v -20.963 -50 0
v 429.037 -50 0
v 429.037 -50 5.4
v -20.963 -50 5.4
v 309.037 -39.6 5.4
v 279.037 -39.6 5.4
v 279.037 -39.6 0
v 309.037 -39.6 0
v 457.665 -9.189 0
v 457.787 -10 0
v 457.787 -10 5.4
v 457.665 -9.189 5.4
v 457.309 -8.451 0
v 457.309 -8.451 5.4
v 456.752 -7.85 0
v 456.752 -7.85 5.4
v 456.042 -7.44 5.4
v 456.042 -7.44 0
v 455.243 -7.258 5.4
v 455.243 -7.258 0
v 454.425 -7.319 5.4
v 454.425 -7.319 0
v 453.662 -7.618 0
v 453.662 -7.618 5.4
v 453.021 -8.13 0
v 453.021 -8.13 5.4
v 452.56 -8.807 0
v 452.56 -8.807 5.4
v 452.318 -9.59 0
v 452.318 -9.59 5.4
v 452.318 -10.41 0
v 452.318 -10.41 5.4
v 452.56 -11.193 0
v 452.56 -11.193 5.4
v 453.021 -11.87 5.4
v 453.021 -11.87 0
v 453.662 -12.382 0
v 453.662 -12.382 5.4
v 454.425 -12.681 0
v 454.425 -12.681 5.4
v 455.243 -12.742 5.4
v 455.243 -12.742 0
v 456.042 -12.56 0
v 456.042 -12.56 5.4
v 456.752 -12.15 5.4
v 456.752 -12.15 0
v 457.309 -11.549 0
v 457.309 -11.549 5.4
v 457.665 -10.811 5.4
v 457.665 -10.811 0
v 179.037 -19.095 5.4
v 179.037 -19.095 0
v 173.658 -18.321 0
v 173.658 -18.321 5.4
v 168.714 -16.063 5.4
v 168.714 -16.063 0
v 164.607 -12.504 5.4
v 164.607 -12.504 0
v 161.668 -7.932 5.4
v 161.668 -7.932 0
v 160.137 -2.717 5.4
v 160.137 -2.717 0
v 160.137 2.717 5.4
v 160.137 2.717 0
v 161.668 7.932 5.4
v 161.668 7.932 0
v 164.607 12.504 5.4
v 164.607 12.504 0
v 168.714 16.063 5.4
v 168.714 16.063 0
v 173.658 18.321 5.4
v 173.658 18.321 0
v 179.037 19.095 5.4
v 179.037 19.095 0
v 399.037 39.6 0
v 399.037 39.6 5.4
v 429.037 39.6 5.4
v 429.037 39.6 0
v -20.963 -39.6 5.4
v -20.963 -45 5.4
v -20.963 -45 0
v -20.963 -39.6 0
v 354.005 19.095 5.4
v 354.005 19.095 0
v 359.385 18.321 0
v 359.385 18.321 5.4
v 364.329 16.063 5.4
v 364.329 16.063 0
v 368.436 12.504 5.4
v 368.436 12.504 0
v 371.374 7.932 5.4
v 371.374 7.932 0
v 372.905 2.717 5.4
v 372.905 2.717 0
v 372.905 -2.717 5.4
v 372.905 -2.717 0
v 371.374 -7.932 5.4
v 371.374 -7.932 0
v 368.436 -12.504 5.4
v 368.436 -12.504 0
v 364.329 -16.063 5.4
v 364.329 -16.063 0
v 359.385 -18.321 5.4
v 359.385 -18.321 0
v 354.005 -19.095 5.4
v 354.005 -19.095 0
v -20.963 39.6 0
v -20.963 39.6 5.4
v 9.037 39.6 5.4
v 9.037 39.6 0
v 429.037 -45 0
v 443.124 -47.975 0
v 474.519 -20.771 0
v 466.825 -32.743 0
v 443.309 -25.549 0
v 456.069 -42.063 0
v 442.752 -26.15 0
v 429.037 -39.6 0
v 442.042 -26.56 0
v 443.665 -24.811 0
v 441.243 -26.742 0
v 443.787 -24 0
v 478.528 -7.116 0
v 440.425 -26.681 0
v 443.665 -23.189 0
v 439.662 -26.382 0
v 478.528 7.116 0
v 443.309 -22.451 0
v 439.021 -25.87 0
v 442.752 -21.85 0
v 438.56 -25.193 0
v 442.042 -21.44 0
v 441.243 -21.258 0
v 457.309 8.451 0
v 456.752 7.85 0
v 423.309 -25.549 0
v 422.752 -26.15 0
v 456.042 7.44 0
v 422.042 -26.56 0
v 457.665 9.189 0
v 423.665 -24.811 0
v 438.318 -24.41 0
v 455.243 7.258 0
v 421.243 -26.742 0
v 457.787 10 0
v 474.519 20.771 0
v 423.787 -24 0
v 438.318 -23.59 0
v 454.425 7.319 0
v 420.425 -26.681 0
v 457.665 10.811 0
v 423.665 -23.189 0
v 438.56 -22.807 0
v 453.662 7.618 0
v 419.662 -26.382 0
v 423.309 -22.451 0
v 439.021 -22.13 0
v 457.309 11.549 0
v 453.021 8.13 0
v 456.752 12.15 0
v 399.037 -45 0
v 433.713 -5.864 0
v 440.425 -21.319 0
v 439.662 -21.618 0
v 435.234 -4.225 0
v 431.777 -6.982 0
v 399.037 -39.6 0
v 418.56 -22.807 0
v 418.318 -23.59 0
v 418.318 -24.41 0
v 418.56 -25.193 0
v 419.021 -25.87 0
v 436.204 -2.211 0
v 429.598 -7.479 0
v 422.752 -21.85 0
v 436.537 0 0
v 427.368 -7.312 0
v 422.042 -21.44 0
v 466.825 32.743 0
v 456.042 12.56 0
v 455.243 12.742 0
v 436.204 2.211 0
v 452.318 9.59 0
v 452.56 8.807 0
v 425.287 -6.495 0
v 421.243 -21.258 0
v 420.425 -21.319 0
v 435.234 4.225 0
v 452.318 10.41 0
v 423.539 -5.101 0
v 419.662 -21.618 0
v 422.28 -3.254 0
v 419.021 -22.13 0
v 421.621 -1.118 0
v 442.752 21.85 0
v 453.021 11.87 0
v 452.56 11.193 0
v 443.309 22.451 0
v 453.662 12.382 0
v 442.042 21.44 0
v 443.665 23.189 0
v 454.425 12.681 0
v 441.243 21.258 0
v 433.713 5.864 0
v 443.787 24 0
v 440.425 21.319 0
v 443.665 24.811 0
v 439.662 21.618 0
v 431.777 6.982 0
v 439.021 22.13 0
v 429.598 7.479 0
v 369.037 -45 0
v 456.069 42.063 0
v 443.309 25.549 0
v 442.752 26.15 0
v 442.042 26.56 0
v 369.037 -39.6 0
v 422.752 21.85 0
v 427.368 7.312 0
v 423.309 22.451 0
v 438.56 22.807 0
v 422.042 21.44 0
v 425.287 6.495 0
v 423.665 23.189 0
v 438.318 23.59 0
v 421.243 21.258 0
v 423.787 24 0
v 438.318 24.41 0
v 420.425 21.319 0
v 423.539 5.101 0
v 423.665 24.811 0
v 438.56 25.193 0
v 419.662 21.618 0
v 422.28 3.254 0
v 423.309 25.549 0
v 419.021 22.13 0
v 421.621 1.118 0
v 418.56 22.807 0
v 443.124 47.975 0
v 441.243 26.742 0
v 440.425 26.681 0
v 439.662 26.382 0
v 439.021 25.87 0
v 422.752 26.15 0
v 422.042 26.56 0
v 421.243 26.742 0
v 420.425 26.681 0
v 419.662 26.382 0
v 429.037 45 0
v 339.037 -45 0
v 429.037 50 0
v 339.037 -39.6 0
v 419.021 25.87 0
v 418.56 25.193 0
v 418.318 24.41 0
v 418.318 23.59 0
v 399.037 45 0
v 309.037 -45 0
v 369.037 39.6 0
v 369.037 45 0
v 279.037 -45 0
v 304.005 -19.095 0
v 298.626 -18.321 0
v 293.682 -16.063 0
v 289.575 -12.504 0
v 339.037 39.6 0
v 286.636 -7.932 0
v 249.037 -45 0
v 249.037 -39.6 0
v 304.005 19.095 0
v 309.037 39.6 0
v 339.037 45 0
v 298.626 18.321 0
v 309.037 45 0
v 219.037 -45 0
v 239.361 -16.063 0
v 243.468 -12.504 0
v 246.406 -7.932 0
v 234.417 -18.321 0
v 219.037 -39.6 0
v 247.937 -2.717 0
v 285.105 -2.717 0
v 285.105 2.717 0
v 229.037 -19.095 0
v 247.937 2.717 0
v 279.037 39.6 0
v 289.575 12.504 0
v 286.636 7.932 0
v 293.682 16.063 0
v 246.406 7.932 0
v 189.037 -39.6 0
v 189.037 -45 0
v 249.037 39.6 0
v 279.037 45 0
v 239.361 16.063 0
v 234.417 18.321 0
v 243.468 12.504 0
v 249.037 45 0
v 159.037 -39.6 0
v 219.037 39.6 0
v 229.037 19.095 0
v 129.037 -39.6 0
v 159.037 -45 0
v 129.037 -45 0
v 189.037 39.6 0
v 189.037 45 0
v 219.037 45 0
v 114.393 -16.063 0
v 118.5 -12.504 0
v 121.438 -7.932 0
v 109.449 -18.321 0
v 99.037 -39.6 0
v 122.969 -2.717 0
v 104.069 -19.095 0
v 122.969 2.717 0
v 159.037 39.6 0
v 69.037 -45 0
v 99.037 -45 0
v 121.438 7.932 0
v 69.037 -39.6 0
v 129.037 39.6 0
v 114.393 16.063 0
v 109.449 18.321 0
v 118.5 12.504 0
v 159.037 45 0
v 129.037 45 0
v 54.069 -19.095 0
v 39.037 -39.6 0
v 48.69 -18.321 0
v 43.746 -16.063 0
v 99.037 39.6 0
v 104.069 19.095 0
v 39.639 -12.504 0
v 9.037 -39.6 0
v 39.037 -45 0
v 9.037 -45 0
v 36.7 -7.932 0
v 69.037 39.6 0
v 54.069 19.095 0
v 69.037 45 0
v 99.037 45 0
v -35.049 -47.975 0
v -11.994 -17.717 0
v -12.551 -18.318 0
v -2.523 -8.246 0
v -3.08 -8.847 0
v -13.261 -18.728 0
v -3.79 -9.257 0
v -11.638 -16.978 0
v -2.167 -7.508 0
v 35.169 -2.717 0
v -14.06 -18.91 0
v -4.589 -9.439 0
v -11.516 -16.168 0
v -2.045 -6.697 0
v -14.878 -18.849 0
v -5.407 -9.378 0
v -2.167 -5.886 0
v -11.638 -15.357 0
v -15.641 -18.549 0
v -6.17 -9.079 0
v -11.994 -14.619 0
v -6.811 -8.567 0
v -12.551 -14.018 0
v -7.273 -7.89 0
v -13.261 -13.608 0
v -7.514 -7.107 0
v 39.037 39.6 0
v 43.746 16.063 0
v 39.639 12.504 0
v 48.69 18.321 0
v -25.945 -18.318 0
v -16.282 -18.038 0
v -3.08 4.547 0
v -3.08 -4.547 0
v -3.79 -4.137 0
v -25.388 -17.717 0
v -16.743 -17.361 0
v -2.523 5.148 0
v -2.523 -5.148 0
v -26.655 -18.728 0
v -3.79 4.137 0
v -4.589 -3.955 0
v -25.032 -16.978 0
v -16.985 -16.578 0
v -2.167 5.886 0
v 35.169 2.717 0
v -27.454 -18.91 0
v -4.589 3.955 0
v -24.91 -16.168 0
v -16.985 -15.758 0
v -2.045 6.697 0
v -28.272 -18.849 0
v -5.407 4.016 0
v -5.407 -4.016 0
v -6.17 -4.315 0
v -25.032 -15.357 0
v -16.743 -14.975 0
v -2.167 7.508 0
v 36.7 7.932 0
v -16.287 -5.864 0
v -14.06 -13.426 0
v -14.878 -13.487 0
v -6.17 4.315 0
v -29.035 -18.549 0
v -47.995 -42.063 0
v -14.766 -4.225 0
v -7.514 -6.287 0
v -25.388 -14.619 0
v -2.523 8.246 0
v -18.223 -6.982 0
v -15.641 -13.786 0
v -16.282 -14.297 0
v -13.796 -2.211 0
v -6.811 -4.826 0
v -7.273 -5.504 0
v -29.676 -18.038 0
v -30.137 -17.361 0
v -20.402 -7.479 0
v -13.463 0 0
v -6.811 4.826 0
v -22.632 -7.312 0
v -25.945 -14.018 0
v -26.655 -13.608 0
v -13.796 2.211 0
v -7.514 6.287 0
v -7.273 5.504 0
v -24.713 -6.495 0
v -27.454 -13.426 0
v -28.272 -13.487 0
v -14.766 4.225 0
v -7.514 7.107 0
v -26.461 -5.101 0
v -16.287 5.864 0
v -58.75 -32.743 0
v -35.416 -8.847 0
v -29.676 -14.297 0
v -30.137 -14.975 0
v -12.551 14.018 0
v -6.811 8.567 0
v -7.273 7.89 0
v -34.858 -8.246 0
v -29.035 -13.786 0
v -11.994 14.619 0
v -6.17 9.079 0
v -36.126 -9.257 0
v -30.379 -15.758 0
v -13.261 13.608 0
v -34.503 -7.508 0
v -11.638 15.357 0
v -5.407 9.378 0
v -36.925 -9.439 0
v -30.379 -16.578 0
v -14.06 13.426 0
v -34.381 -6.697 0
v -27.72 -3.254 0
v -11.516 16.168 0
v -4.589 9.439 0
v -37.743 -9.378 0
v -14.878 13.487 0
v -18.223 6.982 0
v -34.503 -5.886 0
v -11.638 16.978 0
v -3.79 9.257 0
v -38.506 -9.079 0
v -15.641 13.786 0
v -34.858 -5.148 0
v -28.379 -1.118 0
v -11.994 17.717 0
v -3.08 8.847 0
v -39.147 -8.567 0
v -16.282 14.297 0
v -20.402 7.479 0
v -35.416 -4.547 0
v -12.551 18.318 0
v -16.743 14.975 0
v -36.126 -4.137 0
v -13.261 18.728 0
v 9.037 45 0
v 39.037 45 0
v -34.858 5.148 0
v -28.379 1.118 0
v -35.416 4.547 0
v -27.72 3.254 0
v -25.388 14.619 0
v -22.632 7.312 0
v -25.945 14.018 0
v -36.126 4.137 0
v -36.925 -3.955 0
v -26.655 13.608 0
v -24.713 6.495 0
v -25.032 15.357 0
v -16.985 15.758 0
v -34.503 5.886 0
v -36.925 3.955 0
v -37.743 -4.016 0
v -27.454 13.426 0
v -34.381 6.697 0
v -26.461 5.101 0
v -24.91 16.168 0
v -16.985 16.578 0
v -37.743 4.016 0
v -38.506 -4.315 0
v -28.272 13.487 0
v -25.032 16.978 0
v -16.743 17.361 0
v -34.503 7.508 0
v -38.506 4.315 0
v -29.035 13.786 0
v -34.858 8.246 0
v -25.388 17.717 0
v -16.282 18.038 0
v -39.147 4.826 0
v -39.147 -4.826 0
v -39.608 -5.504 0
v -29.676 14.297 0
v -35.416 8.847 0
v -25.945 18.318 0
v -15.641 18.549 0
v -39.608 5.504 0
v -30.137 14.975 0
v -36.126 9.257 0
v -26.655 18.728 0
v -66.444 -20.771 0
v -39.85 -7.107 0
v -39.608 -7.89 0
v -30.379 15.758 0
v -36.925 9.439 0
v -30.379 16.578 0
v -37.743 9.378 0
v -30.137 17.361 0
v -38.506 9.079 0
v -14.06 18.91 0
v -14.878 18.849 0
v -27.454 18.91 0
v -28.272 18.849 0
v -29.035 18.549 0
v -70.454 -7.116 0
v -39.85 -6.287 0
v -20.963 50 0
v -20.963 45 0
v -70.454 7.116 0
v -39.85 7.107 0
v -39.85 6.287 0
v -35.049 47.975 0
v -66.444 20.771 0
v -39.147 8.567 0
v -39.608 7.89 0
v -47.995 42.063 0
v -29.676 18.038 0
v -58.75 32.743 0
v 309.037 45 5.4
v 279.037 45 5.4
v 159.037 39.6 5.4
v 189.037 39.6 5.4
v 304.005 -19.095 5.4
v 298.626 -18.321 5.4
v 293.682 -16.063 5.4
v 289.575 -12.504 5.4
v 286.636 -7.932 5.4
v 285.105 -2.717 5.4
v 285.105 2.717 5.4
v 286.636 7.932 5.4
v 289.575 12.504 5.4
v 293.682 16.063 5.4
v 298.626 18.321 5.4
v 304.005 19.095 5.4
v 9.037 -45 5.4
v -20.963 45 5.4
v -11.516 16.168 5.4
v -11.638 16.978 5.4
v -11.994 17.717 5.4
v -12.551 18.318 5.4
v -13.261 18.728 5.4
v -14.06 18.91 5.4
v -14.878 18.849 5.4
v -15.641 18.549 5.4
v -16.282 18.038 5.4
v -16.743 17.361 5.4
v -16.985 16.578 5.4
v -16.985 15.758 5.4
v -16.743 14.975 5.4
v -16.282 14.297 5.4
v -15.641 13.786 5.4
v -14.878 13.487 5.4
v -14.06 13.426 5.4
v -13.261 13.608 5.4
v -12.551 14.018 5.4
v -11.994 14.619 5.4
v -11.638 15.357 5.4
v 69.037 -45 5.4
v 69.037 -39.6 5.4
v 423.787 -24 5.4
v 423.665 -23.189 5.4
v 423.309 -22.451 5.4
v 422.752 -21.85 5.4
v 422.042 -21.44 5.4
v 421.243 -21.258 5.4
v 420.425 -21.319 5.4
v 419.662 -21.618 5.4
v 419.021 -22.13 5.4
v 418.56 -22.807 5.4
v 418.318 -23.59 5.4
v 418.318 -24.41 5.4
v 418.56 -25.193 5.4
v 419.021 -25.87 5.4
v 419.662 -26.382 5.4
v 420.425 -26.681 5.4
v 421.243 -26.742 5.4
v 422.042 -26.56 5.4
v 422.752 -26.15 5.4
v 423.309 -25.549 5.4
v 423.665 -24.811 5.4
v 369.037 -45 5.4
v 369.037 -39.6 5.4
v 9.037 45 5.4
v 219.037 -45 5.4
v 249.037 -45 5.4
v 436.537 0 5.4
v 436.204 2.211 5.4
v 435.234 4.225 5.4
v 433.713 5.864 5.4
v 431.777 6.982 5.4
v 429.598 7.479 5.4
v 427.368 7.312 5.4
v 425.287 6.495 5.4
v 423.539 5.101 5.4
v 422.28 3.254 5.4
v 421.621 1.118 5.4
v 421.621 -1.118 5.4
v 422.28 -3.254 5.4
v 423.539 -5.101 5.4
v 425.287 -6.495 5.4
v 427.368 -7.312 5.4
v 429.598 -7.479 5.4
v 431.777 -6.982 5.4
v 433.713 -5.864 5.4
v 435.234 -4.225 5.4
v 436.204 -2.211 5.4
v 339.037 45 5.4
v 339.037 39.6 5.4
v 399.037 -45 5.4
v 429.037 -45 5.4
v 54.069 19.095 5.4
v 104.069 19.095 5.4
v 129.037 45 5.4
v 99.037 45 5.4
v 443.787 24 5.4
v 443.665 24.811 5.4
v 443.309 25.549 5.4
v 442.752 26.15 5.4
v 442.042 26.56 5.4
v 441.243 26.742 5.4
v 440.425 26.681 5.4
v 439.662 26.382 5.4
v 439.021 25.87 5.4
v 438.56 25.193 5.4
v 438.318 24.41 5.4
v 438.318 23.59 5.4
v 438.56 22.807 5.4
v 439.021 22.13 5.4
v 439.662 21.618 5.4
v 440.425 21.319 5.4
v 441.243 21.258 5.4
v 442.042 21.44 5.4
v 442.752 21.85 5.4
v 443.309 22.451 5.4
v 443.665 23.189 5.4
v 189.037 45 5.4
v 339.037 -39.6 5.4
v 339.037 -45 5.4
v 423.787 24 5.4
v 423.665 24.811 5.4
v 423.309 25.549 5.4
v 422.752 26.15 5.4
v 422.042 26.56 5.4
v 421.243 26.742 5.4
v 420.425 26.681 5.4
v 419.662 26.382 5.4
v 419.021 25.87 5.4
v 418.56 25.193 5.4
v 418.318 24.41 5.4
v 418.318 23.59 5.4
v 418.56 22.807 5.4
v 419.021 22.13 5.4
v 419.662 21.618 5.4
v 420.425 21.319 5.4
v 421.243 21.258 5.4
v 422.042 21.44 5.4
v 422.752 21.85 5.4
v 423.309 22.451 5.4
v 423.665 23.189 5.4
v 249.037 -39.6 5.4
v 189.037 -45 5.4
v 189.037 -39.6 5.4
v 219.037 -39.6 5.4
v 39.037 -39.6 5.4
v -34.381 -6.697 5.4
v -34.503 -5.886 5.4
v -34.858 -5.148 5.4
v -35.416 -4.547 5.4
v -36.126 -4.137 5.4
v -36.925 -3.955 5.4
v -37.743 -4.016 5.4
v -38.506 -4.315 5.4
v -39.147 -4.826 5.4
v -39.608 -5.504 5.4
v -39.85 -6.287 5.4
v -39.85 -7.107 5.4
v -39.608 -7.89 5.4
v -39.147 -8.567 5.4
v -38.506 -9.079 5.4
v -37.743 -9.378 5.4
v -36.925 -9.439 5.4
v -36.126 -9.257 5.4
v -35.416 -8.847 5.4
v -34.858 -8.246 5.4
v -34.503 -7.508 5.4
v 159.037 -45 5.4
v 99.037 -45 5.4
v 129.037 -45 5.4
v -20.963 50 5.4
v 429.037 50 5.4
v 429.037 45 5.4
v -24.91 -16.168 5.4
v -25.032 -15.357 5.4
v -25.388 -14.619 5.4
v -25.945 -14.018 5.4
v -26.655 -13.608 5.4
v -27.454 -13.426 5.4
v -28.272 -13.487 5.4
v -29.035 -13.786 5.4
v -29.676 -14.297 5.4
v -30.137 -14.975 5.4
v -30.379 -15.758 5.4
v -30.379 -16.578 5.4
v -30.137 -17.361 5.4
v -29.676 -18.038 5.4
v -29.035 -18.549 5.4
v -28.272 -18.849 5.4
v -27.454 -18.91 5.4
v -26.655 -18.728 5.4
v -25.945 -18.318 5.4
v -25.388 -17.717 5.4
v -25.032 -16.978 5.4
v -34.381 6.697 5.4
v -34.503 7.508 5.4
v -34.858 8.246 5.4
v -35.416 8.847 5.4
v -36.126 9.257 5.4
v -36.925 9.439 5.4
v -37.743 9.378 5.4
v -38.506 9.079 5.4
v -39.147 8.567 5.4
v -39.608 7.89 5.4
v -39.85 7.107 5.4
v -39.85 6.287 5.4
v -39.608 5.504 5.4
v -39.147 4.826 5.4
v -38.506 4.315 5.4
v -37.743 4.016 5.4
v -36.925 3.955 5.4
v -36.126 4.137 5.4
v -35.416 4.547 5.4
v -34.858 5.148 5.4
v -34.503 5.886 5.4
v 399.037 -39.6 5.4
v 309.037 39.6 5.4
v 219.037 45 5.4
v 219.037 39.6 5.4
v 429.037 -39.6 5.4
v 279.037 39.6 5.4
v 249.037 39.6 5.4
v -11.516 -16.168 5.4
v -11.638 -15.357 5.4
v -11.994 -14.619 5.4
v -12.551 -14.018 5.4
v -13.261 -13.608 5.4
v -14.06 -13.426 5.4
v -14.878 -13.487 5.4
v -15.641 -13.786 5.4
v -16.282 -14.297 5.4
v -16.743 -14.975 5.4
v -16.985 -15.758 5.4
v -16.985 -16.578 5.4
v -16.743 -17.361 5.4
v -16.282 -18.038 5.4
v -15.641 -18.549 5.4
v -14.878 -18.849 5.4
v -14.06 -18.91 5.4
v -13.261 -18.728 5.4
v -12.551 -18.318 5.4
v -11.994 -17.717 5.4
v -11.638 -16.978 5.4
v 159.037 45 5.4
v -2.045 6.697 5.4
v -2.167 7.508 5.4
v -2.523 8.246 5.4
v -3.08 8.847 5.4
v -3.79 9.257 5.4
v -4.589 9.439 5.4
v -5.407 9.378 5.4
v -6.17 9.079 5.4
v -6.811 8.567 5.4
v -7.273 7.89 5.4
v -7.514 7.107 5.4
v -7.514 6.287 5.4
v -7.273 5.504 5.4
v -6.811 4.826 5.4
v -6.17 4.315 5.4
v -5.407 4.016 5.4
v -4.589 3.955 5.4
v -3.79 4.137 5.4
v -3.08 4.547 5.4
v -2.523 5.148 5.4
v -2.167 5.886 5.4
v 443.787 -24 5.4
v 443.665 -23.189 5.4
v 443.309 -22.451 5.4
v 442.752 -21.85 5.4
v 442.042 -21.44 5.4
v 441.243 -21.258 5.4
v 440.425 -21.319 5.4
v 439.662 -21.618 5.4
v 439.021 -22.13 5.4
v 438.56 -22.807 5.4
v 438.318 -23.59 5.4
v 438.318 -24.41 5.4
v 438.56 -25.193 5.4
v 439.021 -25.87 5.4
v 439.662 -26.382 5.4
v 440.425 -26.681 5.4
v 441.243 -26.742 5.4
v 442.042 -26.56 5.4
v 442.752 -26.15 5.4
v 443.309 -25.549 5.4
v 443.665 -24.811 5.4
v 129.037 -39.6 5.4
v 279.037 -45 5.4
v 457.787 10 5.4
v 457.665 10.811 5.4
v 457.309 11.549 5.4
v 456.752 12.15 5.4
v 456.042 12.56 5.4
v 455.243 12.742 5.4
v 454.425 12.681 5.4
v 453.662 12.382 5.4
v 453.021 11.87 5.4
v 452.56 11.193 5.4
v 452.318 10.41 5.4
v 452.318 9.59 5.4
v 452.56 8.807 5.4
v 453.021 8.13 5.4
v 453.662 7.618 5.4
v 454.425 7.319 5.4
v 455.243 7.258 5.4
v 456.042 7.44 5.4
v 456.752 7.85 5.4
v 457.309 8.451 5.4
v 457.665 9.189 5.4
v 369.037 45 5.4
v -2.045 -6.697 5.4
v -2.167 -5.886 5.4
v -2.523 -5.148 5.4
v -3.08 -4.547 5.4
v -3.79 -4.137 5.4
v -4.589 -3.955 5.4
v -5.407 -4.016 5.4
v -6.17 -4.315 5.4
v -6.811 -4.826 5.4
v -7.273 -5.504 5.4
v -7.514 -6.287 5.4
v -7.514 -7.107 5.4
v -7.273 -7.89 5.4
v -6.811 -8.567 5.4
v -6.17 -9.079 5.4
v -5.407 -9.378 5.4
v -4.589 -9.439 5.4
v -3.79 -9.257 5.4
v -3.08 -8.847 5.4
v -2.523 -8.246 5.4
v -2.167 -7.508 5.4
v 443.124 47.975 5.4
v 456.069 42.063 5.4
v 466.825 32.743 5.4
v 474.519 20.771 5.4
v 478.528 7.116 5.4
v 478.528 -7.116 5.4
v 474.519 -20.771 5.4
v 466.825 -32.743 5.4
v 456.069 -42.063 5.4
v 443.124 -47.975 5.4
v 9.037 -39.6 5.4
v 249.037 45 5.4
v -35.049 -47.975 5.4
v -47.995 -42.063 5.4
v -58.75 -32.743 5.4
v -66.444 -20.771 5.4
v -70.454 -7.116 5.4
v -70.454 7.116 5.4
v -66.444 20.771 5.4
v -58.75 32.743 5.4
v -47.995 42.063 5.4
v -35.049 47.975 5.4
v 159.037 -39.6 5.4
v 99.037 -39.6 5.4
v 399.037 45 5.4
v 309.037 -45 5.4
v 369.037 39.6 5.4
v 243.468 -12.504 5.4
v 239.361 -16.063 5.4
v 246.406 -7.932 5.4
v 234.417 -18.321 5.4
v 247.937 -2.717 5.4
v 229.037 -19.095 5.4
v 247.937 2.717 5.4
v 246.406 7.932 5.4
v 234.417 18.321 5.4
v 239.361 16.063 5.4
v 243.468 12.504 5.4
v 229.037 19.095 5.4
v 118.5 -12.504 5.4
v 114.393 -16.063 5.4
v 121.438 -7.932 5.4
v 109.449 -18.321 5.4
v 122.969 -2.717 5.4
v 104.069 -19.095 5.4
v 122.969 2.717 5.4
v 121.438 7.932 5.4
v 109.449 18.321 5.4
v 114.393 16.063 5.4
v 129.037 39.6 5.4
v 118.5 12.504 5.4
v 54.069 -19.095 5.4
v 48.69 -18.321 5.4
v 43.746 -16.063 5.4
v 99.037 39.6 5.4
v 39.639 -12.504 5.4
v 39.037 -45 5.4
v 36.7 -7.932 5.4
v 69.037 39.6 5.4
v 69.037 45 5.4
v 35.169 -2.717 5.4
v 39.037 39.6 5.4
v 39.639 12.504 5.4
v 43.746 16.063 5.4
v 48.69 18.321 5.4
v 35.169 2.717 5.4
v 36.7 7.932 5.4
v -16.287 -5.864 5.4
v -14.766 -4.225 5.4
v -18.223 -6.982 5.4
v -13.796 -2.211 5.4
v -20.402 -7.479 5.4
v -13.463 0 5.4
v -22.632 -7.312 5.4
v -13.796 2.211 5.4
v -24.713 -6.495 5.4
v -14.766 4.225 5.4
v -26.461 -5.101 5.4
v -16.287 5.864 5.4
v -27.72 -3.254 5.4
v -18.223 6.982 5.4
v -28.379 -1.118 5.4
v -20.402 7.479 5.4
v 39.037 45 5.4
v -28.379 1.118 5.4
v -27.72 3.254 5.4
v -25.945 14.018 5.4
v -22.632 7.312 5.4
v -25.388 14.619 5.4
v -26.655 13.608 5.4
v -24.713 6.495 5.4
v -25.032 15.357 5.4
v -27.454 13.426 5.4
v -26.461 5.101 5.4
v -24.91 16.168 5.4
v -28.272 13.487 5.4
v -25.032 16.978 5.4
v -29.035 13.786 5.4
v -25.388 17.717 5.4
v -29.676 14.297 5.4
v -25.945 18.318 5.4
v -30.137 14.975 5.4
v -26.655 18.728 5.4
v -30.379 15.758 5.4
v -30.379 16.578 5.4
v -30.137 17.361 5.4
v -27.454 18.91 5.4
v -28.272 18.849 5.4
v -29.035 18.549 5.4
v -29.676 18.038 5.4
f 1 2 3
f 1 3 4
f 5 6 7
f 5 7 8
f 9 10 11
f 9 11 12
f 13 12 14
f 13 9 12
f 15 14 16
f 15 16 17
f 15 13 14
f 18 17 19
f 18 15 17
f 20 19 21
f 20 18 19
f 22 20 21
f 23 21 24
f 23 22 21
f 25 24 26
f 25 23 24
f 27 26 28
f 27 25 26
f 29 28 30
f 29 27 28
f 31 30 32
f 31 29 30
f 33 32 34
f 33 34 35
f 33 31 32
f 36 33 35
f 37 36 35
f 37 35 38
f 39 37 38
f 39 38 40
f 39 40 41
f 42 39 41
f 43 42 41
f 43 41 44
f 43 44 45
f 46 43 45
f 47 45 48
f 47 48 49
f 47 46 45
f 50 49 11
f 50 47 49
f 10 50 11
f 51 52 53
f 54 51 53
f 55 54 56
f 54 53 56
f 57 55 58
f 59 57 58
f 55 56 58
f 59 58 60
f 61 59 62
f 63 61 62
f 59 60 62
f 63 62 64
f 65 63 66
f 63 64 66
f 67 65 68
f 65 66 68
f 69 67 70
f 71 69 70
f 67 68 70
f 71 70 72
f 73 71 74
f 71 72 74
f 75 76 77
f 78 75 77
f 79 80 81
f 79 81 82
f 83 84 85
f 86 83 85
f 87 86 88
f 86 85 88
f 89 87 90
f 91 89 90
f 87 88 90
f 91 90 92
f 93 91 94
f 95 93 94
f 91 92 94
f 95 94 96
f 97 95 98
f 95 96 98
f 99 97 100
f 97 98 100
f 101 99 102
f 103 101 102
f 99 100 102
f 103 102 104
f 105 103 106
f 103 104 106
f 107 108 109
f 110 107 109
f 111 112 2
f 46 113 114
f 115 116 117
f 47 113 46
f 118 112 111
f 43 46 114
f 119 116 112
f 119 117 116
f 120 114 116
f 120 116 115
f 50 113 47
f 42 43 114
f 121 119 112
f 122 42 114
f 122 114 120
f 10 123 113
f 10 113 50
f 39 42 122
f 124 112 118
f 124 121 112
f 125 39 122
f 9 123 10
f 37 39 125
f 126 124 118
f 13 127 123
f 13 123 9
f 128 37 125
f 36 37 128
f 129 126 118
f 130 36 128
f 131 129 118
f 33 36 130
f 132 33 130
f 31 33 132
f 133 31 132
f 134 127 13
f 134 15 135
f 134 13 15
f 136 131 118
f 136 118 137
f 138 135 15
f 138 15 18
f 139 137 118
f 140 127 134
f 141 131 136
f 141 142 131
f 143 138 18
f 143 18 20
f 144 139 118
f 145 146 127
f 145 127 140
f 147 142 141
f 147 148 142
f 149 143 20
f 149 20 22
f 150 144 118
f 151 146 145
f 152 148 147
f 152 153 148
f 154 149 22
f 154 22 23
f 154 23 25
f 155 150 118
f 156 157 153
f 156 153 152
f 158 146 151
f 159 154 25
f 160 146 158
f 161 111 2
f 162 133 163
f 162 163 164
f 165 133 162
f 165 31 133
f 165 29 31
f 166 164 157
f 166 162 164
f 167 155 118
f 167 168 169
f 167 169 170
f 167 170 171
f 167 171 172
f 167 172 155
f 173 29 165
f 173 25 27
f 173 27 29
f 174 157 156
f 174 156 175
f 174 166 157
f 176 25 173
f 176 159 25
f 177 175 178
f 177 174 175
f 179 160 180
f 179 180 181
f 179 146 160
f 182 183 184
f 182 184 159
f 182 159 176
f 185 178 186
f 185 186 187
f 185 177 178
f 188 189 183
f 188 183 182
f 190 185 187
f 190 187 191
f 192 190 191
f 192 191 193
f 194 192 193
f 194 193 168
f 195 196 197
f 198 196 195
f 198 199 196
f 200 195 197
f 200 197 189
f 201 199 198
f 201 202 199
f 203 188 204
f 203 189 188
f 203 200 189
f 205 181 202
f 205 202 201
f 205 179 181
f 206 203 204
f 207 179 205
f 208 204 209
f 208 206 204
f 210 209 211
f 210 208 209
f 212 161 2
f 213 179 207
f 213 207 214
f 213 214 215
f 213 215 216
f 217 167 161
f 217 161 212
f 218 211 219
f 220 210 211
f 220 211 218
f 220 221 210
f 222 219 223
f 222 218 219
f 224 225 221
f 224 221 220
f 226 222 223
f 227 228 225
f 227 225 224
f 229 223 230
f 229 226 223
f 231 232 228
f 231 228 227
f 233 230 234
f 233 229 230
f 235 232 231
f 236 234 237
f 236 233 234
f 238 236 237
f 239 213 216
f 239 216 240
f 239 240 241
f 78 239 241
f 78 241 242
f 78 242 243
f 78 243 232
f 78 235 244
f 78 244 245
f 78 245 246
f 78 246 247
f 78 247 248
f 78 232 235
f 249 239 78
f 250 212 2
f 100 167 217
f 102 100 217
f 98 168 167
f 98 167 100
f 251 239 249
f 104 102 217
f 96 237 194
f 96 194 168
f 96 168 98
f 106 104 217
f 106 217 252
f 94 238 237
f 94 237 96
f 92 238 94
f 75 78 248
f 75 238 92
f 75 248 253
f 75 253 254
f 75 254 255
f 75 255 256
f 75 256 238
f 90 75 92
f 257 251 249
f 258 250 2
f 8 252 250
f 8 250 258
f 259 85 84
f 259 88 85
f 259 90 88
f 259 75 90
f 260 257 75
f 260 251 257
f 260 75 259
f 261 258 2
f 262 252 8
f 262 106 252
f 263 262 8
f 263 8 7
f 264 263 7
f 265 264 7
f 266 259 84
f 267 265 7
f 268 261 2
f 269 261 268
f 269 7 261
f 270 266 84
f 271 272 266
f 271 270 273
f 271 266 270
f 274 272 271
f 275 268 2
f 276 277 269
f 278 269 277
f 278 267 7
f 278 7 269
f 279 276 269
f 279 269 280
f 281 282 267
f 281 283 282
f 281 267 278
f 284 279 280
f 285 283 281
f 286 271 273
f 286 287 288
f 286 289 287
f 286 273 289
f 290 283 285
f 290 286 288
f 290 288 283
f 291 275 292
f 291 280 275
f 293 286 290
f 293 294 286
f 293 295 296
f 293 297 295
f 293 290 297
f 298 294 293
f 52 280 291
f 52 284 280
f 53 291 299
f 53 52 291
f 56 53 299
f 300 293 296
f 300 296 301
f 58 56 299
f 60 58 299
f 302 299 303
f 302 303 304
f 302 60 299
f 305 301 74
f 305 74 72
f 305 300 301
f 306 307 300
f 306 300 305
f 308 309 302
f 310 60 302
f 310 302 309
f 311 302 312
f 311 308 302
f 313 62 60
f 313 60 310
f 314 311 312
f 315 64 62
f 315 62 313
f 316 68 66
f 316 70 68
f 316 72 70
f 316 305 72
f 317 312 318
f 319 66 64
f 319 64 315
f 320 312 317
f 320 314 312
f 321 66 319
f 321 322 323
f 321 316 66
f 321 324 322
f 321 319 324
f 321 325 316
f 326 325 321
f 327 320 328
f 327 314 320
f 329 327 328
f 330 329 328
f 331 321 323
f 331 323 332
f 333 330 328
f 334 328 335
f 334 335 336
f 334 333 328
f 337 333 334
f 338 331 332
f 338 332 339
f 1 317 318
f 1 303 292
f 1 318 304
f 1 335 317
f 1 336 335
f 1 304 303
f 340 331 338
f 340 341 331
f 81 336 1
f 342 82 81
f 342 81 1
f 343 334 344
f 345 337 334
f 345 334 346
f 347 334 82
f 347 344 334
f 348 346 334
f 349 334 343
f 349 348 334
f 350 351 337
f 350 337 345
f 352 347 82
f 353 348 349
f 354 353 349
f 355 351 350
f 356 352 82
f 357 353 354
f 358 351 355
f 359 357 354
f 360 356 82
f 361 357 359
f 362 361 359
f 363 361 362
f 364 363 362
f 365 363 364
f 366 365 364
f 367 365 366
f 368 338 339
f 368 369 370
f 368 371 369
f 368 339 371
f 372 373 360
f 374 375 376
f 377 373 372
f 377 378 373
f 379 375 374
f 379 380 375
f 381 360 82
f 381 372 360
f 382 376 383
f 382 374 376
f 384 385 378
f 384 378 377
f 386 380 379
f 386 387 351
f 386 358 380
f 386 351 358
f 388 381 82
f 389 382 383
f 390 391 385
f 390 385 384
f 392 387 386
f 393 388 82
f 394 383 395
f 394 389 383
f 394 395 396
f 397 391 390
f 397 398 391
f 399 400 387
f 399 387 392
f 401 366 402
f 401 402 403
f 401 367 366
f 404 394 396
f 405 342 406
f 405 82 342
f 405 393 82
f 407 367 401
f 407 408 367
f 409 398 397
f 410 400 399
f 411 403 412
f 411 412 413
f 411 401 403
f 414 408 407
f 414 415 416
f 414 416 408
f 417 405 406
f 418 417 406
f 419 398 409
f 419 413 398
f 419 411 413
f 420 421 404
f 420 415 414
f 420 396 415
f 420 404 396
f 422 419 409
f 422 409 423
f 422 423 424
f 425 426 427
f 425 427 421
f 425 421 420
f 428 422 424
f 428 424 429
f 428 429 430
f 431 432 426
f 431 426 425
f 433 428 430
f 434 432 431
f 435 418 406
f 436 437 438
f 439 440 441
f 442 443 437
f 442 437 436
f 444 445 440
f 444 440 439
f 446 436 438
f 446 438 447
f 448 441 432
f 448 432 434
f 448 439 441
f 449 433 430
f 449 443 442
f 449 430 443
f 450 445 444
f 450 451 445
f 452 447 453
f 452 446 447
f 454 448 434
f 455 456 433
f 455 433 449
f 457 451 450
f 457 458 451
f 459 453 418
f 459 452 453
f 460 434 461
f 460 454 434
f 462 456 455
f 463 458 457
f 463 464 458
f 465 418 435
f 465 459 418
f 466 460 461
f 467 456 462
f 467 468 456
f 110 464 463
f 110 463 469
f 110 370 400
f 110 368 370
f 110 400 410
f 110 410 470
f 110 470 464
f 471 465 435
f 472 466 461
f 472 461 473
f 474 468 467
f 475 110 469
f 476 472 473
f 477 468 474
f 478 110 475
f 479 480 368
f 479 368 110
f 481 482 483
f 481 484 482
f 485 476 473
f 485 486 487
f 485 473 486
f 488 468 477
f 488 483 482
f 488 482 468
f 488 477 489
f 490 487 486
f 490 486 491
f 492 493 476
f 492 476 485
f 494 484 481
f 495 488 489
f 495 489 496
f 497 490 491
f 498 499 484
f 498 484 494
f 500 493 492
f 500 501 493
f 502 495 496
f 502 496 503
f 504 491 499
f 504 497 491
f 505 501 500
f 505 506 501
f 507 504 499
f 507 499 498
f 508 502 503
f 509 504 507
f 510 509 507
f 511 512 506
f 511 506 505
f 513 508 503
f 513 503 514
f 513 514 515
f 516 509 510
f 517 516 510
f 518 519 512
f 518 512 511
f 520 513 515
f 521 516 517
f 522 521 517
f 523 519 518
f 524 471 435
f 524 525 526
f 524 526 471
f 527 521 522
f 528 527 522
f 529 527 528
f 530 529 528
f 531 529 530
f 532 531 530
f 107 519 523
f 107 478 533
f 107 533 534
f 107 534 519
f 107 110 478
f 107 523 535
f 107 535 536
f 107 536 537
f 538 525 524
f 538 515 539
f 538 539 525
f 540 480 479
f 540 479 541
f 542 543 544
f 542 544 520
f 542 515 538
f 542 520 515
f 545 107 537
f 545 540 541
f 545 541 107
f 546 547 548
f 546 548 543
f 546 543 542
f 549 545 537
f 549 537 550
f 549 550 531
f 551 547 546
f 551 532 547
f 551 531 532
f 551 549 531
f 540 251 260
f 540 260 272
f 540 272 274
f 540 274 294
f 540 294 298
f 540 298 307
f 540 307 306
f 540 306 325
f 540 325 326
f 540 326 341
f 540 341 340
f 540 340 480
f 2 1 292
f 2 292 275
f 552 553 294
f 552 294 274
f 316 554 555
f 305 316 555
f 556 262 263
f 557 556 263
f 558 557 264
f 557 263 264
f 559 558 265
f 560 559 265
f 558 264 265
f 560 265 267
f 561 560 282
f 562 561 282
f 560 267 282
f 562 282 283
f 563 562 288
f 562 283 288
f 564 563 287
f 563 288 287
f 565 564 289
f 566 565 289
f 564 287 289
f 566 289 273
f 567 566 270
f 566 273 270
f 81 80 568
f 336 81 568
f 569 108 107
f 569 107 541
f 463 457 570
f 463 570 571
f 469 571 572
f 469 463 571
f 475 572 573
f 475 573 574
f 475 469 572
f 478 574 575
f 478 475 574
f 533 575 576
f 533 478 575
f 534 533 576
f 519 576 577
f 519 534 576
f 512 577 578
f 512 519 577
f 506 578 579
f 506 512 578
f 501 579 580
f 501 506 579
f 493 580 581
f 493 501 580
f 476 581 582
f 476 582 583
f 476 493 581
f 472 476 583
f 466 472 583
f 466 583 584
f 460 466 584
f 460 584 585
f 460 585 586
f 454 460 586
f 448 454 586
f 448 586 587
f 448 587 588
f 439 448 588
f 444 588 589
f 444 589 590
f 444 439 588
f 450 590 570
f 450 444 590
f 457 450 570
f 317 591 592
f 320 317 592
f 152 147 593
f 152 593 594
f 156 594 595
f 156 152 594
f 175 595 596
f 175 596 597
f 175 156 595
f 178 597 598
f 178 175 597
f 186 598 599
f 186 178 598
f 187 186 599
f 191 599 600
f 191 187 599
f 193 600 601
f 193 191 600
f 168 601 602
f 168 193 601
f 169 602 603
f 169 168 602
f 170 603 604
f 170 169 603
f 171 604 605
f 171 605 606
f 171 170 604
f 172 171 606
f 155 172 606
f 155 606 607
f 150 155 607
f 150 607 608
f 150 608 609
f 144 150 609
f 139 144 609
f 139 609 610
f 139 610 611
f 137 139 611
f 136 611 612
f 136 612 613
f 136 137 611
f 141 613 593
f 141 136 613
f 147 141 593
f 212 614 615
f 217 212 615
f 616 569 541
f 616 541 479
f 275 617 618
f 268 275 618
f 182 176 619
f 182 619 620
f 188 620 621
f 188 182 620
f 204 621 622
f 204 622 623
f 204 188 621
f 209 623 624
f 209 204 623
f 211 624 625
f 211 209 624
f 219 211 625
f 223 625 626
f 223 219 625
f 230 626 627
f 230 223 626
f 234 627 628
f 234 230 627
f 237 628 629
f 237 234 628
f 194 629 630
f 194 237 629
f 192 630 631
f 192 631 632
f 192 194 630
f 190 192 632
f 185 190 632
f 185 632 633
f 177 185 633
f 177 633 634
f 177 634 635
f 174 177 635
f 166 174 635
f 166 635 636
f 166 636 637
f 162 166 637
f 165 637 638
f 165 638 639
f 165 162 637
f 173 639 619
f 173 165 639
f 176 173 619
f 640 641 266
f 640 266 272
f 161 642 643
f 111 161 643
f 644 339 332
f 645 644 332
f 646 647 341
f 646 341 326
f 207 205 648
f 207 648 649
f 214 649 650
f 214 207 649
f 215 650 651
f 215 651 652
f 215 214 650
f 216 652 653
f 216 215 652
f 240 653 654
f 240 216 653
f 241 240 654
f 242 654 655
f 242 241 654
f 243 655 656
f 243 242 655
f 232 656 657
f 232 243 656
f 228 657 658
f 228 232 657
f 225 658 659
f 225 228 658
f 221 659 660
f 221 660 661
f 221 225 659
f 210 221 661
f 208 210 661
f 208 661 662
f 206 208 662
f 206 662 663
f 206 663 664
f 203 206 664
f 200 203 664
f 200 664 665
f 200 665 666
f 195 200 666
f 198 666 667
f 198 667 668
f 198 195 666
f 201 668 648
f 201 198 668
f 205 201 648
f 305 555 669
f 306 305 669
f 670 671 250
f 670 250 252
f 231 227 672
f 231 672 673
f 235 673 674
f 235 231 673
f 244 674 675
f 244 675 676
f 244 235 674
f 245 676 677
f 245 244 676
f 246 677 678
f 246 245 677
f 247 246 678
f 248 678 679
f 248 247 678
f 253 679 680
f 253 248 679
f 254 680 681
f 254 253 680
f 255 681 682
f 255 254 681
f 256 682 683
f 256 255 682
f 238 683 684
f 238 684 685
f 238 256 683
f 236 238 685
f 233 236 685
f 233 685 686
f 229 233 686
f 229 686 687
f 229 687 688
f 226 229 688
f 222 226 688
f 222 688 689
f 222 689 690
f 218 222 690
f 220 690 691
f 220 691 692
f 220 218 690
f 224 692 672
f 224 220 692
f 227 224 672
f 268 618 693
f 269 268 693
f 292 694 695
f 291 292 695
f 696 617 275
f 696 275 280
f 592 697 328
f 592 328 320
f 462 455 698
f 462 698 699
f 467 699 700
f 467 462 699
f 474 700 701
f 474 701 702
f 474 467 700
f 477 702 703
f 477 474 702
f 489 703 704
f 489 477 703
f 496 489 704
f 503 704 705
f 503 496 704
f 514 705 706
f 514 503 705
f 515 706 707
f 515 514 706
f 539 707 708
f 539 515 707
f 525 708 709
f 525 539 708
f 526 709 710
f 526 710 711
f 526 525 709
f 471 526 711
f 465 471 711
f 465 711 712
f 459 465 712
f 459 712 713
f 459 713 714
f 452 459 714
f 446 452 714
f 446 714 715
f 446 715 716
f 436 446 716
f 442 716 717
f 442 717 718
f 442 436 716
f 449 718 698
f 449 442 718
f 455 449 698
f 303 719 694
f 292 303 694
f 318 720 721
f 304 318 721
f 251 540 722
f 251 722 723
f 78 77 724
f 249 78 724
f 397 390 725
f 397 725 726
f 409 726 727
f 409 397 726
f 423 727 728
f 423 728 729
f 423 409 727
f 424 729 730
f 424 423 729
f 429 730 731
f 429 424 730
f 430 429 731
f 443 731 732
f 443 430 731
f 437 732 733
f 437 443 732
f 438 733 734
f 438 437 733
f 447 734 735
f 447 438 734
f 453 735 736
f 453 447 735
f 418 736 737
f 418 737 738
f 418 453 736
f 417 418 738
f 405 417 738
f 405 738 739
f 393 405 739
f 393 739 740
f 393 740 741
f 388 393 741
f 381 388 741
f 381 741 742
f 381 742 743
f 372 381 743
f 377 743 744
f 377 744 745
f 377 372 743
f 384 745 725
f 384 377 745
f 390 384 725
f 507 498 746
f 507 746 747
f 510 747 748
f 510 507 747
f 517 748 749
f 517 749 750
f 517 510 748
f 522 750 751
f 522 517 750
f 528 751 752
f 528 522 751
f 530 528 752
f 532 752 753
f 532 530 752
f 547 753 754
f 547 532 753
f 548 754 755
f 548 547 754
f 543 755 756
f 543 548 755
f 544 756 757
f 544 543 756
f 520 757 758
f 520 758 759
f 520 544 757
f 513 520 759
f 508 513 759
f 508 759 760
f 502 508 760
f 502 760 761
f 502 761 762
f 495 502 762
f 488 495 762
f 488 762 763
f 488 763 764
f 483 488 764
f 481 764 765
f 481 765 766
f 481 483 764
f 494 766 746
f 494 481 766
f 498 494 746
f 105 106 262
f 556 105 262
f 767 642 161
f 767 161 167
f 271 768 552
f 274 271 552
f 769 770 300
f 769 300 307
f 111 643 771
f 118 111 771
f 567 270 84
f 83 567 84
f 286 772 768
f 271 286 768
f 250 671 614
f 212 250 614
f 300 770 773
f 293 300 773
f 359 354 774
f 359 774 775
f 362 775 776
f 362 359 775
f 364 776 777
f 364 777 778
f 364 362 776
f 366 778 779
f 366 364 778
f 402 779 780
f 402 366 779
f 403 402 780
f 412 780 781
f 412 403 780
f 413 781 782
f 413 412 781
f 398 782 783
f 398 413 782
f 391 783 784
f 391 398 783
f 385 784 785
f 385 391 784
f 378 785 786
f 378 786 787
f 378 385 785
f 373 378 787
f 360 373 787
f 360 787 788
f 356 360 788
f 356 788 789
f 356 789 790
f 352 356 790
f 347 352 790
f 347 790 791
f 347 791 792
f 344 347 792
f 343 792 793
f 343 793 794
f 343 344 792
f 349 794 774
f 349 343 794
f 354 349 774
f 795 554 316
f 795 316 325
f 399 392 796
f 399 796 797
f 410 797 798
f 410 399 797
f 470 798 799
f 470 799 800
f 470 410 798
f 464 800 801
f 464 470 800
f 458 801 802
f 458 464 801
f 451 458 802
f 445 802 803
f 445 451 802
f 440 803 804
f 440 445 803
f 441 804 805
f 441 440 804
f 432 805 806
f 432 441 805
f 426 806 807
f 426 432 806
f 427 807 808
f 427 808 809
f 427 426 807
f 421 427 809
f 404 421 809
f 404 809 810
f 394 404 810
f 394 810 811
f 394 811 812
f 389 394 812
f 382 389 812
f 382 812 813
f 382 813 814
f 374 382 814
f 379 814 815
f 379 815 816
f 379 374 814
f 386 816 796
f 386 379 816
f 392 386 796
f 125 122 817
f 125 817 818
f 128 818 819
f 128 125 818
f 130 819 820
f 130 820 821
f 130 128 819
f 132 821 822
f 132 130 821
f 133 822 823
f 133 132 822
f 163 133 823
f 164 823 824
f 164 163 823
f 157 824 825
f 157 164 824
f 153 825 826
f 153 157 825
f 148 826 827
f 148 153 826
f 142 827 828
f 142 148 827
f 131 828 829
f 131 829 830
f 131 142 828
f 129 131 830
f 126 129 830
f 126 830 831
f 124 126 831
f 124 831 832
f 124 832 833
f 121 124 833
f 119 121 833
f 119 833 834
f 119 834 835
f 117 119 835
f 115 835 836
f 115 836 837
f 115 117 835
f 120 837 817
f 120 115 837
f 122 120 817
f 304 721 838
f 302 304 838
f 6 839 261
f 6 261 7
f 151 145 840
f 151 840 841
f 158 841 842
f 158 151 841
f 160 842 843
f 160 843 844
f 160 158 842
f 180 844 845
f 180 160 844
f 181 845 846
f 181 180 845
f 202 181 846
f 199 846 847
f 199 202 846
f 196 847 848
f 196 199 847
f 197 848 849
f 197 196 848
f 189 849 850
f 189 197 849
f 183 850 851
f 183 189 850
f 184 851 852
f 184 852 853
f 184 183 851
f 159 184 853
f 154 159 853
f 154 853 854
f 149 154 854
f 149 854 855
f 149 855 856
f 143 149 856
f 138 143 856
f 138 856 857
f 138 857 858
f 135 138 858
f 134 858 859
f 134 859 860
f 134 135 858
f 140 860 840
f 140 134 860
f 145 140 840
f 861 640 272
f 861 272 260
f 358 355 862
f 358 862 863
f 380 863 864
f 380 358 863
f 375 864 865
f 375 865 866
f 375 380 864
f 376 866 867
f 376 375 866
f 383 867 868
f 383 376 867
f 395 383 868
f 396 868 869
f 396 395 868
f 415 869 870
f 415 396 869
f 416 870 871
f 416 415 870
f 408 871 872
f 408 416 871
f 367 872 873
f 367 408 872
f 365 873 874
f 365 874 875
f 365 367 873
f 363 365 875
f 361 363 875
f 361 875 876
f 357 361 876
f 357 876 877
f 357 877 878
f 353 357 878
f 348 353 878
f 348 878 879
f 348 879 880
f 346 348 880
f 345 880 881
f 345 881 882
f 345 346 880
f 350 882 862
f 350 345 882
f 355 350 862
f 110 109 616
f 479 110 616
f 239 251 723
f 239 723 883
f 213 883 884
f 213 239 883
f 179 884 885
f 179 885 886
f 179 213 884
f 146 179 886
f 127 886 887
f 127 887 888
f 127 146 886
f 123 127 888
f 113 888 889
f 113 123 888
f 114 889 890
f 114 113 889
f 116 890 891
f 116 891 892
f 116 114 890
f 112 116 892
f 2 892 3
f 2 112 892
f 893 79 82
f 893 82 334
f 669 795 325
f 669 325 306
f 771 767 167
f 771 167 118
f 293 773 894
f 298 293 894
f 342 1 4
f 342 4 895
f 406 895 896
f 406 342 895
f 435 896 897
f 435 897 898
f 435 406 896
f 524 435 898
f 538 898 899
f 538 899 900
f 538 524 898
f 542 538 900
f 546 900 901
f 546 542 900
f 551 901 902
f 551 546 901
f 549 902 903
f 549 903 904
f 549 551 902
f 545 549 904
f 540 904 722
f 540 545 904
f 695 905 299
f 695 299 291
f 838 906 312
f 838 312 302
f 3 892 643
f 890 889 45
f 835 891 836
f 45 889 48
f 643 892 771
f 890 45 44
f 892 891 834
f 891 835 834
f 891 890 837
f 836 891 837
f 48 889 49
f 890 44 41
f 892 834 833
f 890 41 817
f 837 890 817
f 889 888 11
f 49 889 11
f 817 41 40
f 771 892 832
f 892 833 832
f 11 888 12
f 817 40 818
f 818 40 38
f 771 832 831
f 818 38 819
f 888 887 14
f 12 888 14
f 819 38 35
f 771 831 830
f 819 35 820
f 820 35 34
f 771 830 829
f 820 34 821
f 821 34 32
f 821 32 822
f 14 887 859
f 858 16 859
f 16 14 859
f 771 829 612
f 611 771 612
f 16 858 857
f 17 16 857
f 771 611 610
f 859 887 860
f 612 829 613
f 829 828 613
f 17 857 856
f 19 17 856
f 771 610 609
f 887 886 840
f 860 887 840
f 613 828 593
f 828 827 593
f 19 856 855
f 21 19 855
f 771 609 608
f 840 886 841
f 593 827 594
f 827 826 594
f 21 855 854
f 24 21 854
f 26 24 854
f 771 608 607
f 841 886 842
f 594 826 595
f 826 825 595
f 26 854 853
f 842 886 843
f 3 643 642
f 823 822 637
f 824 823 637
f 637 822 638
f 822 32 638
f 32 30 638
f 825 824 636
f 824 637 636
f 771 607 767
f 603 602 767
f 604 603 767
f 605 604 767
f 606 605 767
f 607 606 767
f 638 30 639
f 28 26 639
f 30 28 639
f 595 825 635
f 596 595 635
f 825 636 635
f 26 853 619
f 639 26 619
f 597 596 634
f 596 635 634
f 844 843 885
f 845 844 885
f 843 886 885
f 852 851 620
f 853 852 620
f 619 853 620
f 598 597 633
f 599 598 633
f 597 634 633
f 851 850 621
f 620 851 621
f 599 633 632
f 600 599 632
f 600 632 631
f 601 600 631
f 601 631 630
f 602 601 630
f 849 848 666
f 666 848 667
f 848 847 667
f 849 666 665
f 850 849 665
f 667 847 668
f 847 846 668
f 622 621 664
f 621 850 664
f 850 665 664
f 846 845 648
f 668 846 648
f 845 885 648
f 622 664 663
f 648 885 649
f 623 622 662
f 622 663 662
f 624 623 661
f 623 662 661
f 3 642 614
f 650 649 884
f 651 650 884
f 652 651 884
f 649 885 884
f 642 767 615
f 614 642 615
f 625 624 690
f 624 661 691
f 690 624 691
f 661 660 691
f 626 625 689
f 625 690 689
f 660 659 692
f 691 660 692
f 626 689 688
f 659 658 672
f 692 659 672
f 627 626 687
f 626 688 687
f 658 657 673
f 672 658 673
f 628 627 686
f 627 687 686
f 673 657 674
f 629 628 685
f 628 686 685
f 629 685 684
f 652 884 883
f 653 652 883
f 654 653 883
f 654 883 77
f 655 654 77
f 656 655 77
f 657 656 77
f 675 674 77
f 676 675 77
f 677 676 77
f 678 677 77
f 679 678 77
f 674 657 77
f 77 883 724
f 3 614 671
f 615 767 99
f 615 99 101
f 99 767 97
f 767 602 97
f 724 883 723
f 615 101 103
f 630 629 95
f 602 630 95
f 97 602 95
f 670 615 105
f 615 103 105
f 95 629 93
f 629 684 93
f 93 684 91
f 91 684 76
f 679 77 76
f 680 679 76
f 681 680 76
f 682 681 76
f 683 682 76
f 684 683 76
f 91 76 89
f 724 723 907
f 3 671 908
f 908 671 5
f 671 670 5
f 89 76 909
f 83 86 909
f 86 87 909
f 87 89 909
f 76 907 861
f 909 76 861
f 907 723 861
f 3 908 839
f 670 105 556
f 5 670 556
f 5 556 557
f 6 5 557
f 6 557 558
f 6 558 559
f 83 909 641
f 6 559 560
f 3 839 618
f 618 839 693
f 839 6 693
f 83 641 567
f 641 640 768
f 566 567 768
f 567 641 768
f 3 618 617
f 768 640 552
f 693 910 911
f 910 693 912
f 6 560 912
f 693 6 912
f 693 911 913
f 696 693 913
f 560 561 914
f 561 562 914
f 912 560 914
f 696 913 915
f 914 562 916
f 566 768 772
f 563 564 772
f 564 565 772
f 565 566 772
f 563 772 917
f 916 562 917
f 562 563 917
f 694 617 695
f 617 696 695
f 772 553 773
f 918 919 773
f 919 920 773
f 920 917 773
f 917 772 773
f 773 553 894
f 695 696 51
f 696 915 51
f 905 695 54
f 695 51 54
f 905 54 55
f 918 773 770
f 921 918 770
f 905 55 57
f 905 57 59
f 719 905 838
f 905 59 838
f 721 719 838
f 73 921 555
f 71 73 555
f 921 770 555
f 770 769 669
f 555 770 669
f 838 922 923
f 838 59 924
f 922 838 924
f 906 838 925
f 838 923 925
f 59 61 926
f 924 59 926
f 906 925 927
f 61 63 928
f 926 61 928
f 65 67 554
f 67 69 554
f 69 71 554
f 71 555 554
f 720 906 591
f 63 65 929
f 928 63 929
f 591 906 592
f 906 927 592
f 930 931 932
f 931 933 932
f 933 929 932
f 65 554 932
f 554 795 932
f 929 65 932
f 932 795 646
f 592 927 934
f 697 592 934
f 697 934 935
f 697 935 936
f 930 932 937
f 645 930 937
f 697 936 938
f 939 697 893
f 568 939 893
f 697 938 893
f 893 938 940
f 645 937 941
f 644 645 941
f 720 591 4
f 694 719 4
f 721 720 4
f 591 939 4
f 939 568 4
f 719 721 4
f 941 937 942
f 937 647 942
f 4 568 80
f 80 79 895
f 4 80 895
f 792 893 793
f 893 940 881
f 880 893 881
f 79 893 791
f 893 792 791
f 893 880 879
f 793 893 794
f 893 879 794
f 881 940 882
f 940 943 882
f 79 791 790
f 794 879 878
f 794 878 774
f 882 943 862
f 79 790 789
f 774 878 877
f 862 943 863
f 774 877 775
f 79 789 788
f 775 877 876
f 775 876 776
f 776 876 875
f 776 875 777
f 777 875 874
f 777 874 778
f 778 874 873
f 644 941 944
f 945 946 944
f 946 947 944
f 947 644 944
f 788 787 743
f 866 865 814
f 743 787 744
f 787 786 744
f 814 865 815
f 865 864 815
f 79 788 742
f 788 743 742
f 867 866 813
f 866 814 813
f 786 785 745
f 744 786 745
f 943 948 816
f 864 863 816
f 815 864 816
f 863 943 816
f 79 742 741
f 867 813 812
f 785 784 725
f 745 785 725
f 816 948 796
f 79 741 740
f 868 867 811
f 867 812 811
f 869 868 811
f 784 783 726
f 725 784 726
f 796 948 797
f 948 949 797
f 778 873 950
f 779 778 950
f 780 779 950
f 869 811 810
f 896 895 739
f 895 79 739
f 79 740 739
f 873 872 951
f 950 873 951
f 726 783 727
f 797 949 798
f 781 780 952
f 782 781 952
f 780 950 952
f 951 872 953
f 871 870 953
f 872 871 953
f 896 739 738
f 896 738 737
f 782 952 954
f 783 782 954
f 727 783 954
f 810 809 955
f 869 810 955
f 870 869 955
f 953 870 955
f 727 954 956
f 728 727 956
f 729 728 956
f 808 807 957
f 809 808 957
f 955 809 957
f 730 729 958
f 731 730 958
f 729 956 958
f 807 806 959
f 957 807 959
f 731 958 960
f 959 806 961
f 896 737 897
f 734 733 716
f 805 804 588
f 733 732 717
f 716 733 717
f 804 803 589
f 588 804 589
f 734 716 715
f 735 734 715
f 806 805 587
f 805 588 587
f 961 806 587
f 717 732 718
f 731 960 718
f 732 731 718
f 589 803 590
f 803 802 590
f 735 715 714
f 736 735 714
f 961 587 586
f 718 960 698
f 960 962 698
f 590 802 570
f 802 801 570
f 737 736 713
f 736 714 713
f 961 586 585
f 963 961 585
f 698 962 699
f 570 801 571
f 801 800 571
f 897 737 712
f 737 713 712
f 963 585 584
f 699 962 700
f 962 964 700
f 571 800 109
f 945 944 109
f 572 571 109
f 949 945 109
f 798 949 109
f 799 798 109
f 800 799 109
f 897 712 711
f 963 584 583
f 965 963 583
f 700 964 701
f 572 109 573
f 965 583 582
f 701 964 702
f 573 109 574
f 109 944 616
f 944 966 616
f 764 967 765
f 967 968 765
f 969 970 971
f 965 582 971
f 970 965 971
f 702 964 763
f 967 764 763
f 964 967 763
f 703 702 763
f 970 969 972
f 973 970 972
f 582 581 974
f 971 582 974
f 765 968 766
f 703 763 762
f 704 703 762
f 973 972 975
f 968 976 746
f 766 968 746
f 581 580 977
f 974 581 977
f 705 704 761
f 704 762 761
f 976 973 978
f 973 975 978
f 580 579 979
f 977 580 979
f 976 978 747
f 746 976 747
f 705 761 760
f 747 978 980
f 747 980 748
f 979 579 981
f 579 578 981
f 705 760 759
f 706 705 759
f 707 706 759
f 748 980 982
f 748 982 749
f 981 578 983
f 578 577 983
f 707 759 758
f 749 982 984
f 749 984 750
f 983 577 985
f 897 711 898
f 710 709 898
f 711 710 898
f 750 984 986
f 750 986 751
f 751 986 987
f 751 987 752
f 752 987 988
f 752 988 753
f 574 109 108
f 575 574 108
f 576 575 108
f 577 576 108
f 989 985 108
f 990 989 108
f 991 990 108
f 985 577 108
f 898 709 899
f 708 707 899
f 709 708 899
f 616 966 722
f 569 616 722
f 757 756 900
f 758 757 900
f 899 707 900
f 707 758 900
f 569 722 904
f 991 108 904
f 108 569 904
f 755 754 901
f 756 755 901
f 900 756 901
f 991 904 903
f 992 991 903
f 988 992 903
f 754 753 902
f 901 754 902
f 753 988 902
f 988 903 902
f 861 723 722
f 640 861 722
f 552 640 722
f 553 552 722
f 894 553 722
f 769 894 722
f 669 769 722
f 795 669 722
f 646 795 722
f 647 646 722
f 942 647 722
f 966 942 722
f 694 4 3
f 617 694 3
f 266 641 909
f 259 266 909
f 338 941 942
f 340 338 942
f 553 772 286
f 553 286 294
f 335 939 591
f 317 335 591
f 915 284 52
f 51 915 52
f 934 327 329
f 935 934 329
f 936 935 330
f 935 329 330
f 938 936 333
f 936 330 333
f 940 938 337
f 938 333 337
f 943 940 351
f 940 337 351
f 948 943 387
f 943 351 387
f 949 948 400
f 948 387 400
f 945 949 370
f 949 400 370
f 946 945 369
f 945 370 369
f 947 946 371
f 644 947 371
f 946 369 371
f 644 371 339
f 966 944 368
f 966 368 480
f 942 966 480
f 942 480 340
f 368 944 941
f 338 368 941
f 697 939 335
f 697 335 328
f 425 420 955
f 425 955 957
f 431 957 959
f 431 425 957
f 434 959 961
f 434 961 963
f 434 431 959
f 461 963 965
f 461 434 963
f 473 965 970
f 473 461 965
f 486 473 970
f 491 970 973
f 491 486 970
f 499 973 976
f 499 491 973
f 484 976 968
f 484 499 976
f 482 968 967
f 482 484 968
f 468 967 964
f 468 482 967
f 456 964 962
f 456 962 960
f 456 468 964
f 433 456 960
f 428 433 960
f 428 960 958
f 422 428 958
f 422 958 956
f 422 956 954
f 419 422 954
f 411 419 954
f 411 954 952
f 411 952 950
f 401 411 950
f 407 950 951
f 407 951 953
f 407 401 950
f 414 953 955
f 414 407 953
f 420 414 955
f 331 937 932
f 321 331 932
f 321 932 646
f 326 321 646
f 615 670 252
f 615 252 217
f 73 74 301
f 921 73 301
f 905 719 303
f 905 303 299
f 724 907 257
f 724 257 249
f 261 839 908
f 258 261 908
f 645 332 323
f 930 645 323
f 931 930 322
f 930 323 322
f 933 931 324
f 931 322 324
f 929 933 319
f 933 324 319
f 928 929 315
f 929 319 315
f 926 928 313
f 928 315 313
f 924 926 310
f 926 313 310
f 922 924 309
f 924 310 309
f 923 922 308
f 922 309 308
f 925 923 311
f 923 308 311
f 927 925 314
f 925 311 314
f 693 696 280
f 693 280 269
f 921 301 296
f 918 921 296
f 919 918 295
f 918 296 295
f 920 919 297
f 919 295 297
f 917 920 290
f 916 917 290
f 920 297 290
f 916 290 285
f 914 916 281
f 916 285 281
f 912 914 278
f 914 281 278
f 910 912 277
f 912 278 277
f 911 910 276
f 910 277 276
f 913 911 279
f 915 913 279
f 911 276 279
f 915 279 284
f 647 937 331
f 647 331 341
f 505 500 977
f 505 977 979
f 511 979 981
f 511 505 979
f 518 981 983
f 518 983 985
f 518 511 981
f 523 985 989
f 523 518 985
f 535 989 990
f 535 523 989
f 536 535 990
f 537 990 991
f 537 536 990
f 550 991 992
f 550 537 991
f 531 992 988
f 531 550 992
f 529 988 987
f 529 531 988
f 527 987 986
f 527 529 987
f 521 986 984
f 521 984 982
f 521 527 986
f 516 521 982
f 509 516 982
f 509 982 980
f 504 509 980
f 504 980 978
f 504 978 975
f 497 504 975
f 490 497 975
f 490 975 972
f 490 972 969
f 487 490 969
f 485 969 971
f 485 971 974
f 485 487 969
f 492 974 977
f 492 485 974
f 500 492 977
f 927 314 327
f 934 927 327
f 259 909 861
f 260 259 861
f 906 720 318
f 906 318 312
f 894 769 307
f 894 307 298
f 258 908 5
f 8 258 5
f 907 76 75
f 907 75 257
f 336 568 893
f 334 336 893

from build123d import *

# Parameters (mm, degrees)
SKETCH3_R           = 7.5
SKETCH3_R_2         = 2.75
BOSS_EXTRUDE1_DEPTH = 5.4
SKETCH4_W           = 30
SKETCH4_H           = 5.4
CUT_EXTRUDE1_DEPTH  = 6.4


with BuildPart() as part:
    # Sketch3 → Boss-Extrude1 (new body)
    with BuildSketch(Plane.XY):
        with BuildLine():
            Line((-20.962749028, 50), (429.037250972, 50))
            ThreePointArc((429.037250972, 50), (479.037250972, 0), (429.037250972, -50))
            Line((429.037250972, -50), (-20.962749028, -50))
            ThreePointArc((-20.962749028, -50), (-70.962749028, 0), (-20.962749028, 50))
        make_face()
        with Locations((-20.962749028, 0)):
            Circle(SKETCH3_R, mode=Mode.SUBTRACT)
        with Locations((429.037250972, 0)):
            Circle(SKETCH3_R, mode=Mode.SUBTRACT)
        with Locations((-4.794857209, 6.696960066)):
            Circle(SKETCH3_R_2, mode=Mode.SUBTRACT)
        with Locations((-4.794857209, -6.696960066)):
            Circle(SKETCH3_R_2, mode=Mode.SUBTRACT)
        with Locations((-14.265788962, -16.167891819)):
            Circle(SKETCH3_R_2, mode=Mode.SUBTRACT)
        with Locations((-27.659709094, -16.167891819)):
            Circle(SKETCH3_R_2, mode=Mode.SUBTRACT)
        with Locations((-37.130640847, -6.696960066)):
            Circle(SKETCH3_R_2, mode=Mode.SUBTRACT)
        with Locations((-37.130640847, 6.696960066)):
            Circle(SKETCH3_R_2, mode=Mode.SUBTRACT)
        with Locations((-27.659709094, 16.167891819)):
            Circle(SKETCH3_R_2, mode=Mode.SUBTRACT)
        with Locations((-14.265788962, 16.167891819)):
            Circle(SKETCH3_R_2, mode=Mode.SUBTRACT)
        with Locations((455.037250972, 10)):
            Circle(SKETCH3_R_2, mode=Mode.SUBTRACT)
        with Locations((441.037250972, 24)):
            Circle(SKETCH3_R_2, mode=Mode.SUBTRACT)
        with Locations((421.037250972, 24)):
            Circle(SKETCH3_R_2, mode=Mode.SUBTRACT)
        with Locations((455.037250972, -10)):
            Circle(SKETCH3_R_2, mode=Mode.SUBTRACT)
        with Locations((441.037250972, -24)):
            Circle(SKETCH3_R_2, mode=Mode.SUBTRACT)
        with Locations((421.037250972, -24)):
            Circle(SKETCH3_R_2, mode=Mode.SUBTRACT)
        with BuildLine():
            Line((179.037250972, 19.094555463), (229.037250972, 19.094555463))
            ThreePointArc((229.037250972, 19.094555463), (248.131806435, 0), (229.037250972, -19.094555463))
            Line((229.037250972, -19.094555463), (179.037250972, -19.094555463))
            ThreePointArc((179.037250972, -19.094555463), (159.942695509, 0), (179.037250972, 19.094555463))
        make_face(mode=Mode.SUBTRACT)
        with BuildLine():
            Line((304.005250972, 19.094555463), (354.005250972, 19.094555463))
            ThreePointArc((354.005250972, 19.094555463), (373.099806435, 0), (354.005250972, -19.094555463))
            Line((354.005250972, -19.094555463), (304.005250972, -19.094555463))
            ThreePointArc((304.005250972, -19.094555463), (284.910695509, 0), (304.005250972, 19.094555463))
        make_face(mode=Mode.SUBTRACT)
        with BuildLine():
            Line((54.069250972, 19.094555463), (104.069250972, 19.094555463))
            ThreePointArc((104.069250972, 19.094555463), (123.163806435, 0), (104.069250972, -19.094555463))
            Line((104.069250972, -19.094555463), (54.069250972, -19.094555463))
            ThreePointArc((54.069250972, -19.094555463), (34.974695509, 0), (54.069250972, 19.094555463))
        make_face(mode=Mode.SUBTRACT)
    extrude(amount=BOSS_EXTRUDE1_DEPTH)

    # Sketch4 → Cut-Extrude1 (cut, through all)
    with BuildSketch(Plane.XY.offset(5.4)):
        with Locations((-5.962749028, 42.3)):
            Rectangle(SKETCH4_W, SKETCH4_H)
        with Locations((54.037250972, 42.3)):
            Rectangle(SKETCH4_W, SKETCH4_H)
        with Locations((114.037250972, 42.3)):
            Rectangle(SKETCH4_W, SKETCH4_H)
        with Locations((174.037250972, 42.3)):
            Rectangle(SKETCH4_W, SKETCH4_H)
        with Locations((234.037250972, 42.3)):
            Rectangle(SKETCH4_W, SKETCH4_H)
        with Locations((294.037250972, 42.3)):
            Rectangle(SKETCH4_W, SKETCH4_H)
        with Locations((354.037250972, 42.3)):
            Rectangle(SKETCH4_W, SKETCH4_H)
        with Locations((414.037250972, 42.3)):
            Rectangle(SKETCH4_W, SKETCH4_H)
        with Locations((414.037250972, -42.3)):
            Rectangle(SKETCH4_W, SKETCH4_H)
        with Locations((354.037250972, -42.3)):
            Rectangle(SKETCH4_W, SKETCH4_H)
        with Locations((294.037250972, -42.3)):
            Rectangle(SKETCH4_W, SKETCH4_H)
        with Locations((234.037250972, -42.3)):
            Rectangle(SKETCH4_W, SKETCH4_H)
        with Locations((174.037250972, -42.3)):
            Rectangle(SKETCH4_W, SKETCH4_H)
        with Locations((114.037250972, -42.3)):
            Rectangle(SKETCH4_W, SKETCH4_H)
        with Locations((54.037250972, -42.3)):
            Rectangle(SKETCH4_W, SKETCH4_H)
        with Locations((-5.962749028, -42.3)):
            Rectangle(SKETCH4_W, SKETCH4_H)
    extrude(amount=-CUT_EXTRUDE1_DEPTH, mode=Mode.SUBTRACT)


solid = part.part
